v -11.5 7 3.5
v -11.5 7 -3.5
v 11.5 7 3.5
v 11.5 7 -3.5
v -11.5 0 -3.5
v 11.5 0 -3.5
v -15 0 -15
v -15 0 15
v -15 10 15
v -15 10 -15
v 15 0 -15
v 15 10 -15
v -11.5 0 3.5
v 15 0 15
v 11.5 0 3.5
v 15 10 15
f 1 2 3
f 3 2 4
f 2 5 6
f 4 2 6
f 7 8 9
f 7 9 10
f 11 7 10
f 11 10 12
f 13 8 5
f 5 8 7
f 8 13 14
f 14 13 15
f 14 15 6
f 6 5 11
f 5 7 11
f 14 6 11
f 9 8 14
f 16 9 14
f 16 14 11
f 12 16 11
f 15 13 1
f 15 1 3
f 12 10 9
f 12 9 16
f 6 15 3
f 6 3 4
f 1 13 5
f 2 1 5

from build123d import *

# Parameters (mm, degrees)
SKETCH1_W           = 30
SKETCH1_H           = 30
SKETCH1_W_2         = 23
SKETCH1_H_2         = 7
BOSS_EXTRUDE1_DEPTH = 10
BOSS_EXTRUDE2_START = 7
SKETCH1_2_W         = 23
SKETCH1_2_H         = 7
BOSS_EXTRUDE2_DEPTH = 3


with BuildPart() as part:
    # Sketch1 → Boss-Extrude1 (new body)
    with BuildSketch(Plane(origin=(0, 0, 0), x_dir=(1, 0, 0), z_dir=(0, 1, 0))):
        Rectangle(SKETCH1_W, SKETCH1_H)
        Rectangle(SKETCH1_W_2, SKETCH1_H_2, mode=Mode.SUBTRACT)
    extrude(amount=BOSS_EXTRUDE1_DEPTH)

    # Sketch1<2> → Boss-Extrude2 (add)
    with BuildSketch(Plane(origin=(0, 0, 0), x_dir=(1, 0, 0), z_dir=(0, 1, 0)).offset(BOSS_EXTRUDE2_START)):
        Rectangle(SKETCH1_2_W, SKETCH1_2_H)
    extrude(amount=BOSS_EXTRUDE2_DEPTH)


solid = part.part
